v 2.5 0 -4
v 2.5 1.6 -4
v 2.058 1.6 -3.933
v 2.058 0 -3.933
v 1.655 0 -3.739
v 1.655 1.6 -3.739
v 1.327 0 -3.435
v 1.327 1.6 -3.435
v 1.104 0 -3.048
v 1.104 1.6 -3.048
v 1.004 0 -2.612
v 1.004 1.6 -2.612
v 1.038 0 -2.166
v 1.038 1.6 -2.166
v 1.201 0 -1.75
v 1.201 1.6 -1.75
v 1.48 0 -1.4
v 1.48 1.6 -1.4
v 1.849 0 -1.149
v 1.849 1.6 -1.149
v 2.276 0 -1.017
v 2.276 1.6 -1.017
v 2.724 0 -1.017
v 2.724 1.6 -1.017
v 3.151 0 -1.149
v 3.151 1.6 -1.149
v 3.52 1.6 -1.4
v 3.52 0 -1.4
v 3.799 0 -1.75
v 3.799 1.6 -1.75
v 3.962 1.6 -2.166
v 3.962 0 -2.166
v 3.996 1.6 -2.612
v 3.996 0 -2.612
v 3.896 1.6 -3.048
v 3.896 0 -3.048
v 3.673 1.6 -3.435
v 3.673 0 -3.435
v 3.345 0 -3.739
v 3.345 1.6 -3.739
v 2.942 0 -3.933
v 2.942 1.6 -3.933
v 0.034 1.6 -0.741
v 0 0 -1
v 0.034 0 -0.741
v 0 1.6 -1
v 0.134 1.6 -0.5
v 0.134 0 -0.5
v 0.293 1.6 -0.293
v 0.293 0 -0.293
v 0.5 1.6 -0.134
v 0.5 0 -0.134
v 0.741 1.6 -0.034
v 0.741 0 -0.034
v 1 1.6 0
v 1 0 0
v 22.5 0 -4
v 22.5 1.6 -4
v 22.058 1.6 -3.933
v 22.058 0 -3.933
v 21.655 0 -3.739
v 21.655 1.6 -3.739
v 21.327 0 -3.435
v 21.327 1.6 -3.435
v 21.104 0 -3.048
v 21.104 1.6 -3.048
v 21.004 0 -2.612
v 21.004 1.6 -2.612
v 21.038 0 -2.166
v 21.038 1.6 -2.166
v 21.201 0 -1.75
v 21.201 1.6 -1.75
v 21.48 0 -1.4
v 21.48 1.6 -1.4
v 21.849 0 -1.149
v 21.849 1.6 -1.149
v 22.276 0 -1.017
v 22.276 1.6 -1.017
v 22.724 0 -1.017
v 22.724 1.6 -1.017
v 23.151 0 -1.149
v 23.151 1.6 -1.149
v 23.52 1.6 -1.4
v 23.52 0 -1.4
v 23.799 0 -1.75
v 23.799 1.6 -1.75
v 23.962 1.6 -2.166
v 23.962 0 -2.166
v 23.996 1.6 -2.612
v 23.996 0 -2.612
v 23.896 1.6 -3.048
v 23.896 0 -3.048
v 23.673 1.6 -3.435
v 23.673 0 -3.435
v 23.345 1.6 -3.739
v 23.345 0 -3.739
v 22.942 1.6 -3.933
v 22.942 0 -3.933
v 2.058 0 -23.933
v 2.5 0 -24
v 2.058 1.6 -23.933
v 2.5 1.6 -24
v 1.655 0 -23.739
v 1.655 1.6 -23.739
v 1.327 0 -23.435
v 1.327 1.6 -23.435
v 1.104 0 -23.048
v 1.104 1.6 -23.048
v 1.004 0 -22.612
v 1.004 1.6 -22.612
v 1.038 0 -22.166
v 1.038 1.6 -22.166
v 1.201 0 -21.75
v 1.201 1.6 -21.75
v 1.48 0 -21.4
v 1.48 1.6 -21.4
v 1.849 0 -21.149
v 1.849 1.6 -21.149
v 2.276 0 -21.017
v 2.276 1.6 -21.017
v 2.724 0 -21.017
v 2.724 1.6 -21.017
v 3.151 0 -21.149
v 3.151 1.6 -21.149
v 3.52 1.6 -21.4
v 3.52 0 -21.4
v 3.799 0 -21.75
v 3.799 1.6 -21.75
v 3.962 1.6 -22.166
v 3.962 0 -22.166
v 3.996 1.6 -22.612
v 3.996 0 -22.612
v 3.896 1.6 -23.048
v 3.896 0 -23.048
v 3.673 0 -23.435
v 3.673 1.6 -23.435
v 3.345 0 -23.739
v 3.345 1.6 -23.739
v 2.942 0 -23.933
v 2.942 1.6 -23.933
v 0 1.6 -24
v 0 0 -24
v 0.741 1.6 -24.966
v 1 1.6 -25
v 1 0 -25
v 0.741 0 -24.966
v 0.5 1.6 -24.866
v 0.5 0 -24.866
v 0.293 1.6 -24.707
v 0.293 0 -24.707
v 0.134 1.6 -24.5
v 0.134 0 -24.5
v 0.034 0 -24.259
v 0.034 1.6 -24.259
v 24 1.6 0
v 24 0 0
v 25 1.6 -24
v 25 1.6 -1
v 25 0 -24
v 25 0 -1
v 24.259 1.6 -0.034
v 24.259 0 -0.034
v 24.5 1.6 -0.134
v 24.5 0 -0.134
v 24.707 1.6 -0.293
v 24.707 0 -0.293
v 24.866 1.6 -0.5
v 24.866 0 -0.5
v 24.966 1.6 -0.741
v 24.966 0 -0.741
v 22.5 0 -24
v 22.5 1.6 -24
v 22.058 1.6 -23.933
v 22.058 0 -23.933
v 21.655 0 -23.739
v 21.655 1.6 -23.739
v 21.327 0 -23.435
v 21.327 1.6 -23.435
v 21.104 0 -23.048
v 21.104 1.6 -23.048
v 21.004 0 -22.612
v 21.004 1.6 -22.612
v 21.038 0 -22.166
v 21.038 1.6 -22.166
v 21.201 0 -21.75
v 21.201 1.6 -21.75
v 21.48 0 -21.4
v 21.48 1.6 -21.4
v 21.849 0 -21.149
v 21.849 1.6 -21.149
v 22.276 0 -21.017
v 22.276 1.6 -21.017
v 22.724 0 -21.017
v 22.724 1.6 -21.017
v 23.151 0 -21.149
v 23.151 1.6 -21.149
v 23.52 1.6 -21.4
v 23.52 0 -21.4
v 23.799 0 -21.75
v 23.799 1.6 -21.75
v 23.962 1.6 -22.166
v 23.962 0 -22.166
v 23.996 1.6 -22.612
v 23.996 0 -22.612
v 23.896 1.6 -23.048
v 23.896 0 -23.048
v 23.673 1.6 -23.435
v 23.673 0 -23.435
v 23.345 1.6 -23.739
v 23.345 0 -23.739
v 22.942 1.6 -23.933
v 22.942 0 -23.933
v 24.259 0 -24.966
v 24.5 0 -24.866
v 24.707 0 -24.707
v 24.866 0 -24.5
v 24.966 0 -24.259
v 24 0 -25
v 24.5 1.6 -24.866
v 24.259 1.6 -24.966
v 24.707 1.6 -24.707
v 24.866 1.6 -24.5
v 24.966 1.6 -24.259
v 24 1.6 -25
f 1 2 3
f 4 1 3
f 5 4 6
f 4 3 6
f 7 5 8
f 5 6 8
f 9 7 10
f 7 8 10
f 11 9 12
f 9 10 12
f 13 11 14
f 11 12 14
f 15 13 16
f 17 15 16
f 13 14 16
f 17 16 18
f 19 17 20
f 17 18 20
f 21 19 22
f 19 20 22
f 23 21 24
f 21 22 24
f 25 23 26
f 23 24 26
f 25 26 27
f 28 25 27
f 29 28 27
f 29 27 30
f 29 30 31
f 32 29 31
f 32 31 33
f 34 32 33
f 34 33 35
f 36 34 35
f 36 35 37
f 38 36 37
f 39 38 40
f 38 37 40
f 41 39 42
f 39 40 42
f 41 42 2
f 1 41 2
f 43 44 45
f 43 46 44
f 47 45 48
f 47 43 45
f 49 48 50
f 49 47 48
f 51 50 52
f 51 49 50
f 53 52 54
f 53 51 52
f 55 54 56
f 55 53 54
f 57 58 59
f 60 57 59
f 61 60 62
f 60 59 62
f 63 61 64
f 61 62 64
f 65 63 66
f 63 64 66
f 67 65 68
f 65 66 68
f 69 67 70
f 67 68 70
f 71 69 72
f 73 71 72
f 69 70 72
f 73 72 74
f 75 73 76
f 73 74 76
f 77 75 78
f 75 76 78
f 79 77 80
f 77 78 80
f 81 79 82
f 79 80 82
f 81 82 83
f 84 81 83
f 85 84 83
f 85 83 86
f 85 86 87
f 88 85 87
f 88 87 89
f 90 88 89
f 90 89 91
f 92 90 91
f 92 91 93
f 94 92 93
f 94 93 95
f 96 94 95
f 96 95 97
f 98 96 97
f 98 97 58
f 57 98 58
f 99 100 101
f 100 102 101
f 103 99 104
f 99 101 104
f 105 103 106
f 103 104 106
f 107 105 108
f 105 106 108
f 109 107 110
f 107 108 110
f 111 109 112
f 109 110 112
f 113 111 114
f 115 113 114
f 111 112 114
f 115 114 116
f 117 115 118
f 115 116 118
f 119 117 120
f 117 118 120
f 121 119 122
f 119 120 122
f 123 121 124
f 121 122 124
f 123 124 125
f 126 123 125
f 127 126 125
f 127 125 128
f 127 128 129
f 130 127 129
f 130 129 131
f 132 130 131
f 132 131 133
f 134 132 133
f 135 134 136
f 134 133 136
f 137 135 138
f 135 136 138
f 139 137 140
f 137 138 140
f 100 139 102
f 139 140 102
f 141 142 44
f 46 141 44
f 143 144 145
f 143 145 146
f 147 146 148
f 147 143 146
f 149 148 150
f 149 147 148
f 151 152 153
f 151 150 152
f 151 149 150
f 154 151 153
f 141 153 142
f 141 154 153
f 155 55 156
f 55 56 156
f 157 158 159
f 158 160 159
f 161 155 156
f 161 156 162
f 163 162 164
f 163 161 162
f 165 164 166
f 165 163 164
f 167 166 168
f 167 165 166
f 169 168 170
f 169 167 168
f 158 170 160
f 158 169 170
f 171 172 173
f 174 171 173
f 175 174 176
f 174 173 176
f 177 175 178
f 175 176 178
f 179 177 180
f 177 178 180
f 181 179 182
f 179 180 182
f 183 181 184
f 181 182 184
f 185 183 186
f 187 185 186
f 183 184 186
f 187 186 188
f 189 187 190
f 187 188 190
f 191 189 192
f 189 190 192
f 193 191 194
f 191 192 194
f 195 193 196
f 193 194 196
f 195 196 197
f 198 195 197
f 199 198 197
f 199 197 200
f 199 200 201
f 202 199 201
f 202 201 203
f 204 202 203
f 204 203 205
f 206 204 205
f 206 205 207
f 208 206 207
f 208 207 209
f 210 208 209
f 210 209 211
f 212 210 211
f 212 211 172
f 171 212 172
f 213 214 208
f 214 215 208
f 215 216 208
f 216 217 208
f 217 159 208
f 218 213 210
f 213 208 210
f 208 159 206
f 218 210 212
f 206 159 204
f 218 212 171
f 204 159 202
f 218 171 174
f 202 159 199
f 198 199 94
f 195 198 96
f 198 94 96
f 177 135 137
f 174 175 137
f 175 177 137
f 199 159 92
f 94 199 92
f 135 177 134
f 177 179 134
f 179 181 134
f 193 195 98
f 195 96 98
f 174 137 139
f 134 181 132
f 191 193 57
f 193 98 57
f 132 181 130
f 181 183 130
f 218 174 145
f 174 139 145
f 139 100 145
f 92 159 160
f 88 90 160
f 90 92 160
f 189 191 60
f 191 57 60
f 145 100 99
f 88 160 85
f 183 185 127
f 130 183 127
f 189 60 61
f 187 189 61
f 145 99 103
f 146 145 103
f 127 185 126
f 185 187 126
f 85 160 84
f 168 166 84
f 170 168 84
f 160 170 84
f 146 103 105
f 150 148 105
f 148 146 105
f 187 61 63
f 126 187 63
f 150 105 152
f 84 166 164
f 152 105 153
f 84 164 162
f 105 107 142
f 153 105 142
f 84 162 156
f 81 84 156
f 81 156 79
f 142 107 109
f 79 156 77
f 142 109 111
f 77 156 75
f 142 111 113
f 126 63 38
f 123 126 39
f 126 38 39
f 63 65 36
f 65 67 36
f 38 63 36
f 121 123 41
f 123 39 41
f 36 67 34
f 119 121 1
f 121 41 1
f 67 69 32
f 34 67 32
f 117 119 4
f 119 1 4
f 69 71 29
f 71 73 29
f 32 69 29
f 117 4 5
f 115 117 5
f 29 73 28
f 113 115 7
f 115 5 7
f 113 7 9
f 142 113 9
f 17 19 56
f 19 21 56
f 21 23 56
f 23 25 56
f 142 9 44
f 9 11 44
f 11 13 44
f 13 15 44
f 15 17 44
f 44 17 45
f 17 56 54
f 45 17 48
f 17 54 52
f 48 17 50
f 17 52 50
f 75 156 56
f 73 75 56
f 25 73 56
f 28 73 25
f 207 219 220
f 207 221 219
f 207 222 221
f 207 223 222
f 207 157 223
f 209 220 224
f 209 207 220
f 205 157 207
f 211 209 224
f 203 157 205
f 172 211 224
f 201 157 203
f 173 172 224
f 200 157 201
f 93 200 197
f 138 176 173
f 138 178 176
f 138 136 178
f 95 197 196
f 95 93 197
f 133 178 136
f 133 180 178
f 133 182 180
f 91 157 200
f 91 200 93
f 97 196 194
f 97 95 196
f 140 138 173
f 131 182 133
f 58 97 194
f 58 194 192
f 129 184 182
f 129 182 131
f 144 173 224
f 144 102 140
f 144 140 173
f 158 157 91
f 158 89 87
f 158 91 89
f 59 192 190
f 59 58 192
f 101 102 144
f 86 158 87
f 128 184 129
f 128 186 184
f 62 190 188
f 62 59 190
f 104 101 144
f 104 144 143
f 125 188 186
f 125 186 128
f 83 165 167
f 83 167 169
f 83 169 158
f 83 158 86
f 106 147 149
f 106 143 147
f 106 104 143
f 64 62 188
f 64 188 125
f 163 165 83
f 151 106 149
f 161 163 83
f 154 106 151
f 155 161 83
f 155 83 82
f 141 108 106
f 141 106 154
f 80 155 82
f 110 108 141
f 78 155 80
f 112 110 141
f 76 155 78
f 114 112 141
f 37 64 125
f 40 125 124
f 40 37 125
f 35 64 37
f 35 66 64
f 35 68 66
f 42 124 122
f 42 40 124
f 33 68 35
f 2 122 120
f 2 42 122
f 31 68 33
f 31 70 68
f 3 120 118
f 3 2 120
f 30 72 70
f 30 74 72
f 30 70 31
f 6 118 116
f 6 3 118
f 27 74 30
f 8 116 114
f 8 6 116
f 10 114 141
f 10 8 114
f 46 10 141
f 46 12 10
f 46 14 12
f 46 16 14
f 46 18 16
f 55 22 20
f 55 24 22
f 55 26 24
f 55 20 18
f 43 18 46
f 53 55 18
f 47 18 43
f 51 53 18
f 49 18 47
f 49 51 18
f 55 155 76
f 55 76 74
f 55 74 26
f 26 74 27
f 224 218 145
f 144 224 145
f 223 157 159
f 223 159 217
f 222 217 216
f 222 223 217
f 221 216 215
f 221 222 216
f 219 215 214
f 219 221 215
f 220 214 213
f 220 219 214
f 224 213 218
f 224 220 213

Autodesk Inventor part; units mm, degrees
ref_plane "YZ Plane" through (0, 0, 0) normal (1, 0, 0) x (0, 1, 0)
ref_plane "XZ Plane" through (0, 0, 0) normal (0, 1, 0) x (-1, 0, 0)
ref_plane "XY Plane" through (0, 0, 0) normal (0, 0, 1) x (1, 0, 0)
sketch "Sketch1" plane through (0, 0, 0) normal (0, 1, 0) x (-1, 0, 0)
  line L0 (0, 0) -> (-25, 0)
  line L1 (-25, 0) -> (-25, -25)
  line L2 (-25, -25) -> (0, -25)
  line L3 (0, -25) -> (0, 0)
  line L4 (-2.5, -22.5) -> (-22.5, -22.5) construction
  line L5 (-22.5, -22.5) -> (-22.5, -2.5) construction
  line L6 (-22.5, -2.5) -> (-2.5, -2.5) construction
  line L7 (-2.5, -2.5) -> (-2.5, -22.5) construction
  dimension "d0" = 25
  dimension "d1" = 25
  dimension "d2" = 20
  dimension "d3" = 20
  dimension "d4" = 2.5
  dimension "d5" = 2.5
extrude "Extrusion1" add sketch "Sketch1" along normal blind 1.6
hole "Hole1" at (2.5, 0, -22.5) at (2.5, 0, -2.5) at (22.5, 0, -2.5) at (22.5, 0, -22.5) direction (0, 1, 0) diameter 3 depth 8 tip angle 118
fillet "Fillet1" radius 1 4 edges at (25, 0.8, -25) (25, 0.8, 0) (0, 0.8, -25) (0, 0.8, 0)
properties part number "Large Encoder PCB"
